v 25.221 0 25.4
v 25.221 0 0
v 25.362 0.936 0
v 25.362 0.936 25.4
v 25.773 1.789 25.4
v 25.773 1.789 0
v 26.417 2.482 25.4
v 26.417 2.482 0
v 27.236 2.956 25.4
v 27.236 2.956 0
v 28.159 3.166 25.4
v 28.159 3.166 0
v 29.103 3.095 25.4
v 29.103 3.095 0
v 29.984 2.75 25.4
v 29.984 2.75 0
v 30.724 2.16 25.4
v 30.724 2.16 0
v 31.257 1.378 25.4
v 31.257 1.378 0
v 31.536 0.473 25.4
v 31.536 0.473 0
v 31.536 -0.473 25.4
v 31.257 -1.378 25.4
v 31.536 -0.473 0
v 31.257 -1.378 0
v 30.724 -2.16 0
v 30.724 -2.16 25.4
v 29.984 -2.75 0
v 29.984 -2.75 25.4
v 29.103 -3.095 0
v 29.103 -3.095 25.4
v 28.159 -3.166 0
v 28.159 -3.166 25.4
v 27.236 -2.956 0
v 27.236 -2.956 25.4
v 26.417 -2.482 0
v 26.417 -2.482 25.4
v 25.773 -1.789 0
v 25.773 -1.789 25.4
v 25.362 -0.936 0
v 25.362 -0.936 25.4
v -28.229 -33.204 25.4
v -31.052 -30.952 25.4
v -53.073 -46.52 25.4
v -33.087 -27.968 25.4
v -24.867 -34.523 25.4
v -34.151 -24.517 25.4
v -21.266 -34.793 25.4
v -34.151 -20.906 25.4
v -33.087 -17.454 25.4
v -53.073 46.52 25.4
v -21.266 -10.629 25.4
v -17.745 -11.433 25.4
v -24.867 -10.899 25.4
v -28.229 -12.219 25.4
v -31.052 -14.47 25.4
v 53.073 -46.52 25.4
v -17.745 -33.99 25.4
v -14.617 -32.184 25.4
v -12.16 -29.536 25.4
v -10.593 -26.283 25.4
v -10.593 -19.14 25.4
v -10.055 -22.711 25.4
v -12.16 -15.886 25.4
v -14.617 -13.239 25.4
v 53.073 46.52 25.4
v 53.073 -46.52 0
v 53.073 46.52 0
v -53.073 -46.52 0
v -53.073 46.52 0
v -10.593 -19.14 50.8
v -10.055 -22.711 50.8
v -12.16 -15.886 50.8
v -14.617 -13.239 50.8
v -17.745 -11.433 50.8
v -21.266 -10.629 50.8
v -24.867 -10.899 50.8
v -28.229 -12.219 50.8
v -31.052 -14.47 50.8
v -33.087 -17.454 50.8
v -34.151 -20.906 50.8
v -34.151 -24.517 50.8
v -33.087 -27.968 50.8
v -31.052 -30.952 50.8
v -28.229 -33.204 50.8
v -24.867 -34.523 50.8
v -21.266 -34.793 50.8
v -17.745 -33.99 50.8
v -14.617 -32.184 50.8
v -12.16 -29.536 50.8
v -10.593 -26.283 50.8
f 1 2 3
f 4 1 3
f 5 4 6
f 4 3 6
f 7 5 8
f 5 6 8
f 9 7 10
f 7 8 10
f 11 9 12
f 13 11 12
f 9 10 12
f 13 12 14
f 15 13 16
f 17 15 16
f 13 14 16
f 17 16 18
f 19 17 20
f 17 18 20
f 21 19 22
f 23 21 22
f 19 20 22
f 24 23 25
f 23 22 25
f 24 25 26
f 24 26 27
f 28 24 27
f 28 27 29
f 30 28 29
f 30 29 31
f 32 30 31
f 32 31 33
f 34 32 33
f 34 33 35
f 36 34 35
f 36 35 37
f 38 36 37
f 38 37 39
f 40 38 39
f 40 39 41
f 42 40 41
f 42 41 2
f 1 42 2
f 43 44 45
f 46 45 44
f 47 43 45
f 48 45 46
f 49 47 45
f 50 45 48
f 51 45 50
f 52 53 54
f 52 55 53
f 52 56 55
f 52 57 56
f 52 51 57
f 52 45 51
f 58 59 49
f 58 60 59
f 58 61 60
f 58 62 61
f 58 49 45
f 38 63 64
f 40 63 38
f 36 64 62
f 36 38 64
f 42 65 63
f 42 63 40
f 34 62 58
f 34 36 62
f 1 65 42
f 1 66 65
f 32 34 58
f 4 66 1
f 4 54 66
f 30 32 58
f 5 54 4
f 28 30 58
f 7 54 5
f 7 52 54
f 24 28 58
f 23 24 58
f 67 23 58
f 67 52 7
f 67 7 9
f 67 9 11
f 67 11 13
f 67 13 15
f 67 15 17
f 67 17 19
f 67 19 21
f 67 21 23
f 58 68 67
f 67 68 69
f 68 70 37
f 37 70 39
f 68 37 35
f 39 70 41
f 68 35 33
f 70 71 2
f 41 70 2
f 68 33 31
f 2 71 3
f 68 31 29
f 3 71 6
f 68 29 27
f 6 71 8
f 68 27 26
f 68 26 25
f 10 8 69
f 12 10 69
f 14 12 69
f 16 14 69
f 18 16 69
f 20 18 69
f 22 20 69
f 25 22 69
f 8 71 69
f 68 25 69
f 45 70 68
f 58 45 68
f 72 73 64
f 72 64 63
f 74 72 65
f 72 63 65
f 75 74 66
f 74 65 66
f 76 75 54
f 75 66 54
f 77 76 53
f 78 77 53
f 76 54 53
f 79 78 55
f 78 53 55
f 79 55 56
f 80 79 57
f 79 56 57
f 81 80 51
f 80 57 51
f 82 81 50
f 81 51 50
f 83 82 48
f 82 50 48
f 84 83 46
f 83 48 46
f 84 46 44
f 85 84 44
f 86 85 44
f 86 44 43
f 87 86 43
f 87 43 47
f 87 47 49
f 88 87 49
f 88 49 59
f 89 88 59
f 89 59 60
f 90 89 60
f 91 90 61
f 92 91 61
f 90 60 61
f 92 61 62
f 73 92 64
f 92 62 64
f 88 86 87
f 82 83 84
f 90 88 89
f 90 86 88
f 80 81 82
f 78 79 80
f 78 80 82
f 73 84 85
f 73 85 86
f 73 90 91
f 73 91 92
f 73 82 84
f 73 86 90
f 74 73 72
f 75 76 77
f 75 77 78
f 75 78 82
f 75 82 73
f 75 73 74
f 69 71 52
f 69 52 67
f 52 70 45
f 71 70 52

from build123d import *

# Parameters (mm, degrees)
F0_W     = 106.146804
F0_H     = 93.039534
F1_DEPTH = 25.4
F3_D     = 6.35
F4_R     = 12.11582
F5_DEPTH = 25.4


with BuildPart() as f1:
    # F0 (on Top) → F1 (new body)
    with BuildSketch(Plane.XY):
        Rectangle(F0_W, F0_H)
    extrude(amount=F1_DEPTH)

    # F3 (through all)
    with Locations(Plane.XY.offset(25.4)):
        with Locations((28.396336, 0)):
            Hole(F3_D / 2)

    # F4 (on face) → F5 (join)
    with BuildSketch(Plane.XY.offset(25.4)):
        with Locations((-22.170972, -22.711303)):
            Circle(F4_R)
    extrude(amount=F5_DEPTH)


solid = f1.part
